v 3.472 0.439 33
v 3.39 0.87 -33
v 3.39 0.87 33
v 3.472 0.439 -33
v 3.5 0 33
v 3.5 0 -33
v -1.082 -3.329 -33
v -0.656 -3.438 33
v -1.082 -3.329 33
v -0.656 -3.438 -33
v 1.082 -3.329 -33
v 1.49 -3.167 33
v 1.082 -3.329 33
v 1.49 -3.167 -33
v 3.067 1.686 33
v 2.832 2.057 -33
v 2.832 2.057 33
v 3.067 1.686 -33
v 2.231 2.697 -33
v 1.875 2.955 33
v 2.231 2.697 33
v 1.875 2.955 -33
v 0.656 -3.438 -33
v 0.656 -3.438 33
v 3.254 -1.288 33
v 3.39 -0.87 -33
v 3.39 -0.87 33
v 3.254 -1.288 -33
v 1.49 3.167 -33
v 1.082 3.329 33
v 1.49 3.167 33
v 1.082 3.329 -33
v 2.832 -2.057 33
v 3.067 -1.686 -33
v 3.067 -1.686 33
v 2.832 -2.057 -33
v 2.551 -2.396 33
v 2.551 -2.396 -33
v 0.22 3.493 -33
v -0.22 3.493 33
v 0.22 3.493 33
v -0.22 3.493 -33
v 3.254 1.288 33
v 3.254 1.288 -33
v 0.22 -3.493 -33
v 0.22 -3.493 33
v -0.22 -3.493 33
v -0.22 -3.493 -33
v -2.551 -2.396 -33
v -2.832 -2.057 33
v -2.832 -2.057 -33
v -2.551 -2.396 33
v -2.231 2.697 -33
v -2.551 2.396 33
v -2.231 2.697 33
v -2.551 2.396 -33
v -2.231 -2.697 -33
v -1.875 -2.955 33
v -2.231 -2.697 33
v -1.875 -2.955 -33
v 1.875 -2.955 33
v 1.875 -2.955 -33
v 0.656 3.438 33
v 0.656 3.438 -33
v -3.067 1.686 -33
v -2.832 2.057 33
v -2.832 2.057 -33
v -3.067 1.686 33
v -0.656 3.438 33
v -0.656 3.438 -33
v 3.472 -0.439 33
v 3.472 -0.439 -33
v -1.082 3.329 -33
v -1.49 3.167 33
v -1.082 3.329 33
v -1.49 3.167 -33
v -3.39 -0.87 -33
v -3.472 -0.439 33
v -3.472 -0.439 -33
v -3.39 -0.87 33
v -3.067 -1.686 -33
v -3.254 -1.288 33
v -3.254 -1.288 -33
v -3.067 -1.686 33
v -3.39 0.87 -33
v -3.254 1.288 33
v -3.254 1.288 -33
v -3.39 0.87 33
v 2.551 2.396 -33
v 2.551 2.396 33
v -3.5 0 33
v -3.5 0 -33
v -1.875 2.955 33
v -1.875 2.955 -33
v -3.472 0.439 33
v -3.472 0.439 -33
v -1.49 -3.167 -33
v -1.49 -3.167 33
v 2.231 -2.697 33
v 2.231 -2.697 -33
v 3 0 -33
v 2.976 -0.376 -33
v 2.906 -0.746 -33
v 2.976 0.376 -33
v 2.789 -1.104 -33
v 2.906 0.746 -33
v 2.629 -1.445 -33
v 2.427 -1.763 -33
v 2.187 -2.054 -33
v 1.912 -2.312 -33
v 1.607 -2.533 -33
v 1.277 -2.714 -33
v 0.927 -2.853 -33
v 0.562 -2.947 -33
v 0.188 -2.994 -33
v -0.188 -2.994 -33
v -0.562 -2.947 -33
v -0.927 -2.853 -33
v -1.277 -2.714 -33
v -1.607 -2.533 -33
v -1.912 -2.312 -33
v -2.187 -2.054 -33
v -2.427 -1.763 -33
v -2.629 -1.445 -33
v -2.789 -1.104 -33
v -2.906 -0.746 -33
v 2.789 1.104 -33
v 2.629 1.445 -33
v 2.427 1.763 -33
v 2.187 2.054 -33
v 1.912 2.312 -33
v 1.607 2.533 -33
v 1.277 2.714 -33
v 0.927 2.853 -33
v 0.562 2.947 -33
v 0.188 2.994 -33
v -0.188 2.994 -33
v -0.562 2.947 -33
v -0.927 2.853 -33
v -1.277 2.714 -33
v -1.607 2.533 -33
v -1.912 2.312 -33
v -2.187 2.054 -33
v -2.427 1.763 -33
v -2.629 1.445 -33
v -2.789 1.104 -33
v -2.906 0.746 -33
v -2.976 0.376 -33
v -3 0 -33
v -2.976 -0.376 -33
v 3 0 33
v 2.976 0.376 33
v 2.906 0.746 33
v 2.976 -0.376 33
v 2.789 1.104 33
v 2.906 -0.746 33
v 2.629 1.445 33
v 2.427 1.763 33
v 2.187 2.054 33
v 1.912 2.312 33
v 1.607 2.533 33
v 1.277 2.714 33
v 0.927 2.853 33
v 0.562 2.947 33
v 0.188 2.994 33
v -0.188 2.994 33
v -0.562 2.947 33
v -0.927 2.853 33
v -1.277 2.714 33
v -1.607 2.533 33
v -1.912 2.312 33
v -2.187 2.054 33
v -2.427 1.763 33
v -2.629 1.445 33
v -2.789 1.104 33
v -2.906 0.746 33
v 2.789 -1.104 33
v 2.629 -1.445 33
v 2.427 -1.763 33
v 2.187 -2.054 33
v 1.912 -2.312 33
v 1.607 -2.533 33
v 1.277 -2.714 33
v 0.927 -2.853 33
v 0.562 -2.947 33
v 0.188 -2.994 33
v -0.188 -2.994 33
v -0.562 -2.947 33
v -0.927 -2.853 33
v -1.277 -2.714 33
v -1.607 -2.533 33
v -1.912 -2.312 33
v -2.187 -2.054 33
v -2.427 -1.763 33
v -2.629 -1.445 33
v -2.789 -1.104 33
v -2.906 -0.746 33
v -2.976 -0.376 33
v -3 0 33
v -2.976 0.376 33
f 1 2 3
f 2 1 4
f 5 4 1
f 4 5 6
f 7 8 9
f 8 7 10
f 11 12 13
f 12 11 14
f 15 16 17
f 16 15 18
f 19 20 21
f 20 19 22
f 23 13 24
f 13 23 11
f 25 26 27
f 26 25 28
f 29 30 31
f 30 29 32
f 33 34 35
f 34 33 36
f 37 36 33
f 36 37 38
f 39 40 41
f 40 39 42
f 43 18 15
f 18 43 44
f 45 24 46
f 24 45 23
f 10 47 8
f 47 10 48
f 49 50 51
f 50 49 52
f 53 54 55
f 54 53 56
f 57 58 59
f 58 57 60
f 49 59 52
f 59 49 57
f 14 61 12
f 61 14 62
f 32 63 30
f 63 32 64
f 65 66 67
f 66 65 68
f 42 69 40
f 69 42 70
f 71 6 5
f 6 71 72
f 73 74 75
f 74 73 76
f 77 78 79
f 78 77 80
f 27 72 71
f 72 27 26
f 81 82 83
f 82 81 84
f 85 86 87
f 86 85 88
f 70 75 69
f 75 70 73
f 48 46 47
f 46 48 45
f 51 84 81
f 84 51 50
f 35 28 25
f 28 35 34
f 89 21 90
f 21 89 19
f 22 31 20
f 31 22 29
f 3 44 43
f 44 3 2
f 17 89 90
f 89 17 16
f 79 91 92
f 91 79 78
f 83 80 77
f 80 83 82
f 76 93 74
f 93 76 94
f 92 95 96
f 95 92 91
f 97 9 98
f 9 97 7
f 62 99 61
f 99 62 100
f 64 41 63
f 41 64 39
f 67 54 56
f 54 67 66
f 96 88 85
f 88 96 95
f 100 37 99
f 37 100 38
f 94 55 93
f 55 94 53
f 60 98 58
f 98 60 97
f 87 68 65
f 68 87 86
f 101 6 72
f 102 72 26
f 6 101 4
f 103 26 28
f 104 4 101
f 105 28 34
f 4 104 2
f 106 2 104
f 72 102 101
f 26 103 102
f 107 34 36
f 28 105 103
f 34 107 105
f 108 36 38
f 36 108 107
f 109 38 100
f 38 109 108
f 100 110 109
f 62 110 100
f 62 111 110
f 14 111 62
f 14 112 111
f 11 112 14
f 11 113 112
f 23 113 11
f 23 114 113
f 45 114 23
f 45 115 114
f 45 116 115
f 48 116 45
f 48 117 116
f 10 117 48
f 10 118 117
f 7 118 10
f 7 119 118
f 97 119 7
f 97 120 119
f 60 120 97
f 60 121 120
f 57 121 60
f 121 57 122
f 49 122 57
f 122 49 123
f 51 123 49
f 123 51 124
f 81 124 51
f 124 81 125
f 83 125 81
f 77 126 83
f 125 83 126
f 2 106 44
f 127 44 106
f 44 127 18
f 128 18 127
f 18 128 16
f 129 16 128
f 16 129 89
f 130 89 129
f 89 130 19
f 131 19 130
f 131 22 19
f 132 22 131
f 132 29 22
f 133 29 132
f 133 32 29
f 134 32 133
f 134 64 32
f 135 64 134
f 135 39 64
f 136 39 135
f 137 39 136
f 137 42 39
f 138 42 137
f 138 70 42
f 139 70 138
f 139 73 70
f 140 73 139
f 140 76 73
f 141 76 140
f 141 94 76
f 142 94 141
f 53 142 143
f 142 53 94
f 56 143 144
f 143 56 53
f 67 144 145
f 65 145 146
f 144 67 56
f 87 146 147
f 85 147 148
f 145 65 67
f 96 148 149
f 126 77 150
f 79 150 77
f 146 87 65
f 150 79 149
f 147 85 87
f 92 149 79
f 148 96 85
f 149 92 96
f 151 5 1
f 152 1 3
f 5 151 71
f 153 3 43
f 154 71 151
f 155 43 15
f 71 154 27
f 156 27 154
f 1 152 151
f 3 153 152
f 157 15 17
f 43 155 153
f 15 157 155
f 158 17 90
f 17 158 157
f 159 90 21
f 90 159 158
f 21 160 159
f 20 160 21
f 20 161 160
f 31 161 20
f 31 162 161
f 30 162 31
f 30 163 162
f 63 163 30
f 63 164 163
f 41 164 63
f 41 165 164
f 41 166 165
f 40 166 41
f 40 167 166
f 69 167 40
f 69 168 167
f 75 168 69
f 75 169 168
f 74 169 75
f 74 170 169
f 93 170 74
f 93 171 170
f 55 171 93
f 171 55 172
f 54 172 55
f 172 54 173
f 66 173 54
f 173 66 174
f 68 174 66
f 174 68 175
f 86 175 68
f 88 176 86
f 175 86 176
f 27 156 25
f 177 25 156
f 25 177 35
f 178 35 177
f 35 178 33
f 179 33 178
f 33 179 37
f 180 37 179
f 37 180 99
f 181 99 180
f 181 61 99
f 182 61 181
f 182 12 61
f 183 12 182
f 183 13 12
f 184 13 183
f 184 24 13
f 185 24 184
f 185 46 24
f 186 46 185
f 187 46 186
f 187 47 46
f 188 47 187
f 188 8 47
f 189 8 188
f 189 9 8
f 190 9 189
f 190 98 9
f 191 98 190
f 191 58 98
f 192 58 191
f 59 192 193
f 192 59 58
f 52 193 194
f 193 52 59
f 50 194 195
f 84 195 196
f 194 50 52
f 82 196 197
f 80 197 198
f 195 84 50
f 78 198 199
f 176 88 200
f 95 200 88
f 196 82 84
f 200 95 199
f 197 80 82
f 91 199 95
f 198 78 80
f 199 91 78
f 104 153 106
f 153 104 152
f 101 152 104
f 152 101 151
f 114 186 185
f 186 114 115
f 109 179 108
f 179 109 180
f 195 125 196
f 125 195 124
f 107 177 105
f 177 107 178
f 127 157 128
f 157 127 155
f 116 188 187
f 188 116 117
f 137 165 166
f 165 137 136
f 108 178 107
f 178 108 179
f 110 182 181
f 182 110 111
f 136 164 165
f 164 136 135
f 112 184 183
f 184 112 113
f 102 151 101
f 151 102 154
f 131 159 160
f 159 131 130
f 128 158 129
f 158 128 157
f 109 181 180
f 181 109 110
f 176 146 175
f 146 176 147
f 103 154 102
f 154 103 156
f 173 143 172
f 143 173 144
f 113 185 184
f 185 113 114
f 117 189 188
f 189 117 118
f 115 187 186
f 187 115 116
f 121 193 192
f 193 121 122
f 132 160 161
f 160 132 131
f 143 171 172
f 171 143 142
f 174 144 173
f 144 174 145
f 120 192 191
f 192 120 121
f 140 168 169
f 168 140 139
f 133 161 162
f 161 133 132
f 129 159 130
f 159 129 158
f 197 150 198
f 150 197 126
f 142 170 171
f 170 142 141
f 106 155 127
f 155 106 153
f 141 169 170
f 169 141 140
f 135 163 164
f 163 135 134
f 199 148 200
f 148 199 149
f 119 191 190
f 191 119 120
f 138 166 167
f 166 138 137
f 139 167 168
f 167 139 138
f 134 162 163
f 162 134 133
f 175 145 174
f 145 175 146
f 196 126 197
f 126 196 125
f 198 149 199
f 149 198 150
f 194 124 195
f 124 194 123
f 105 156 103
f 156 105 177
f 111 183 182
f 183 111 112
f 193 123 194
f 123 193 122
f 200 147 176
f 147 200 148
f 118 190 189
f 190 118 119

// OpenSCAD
$fn = 50;


difference() {
	union() {
		translate(v = [0, 0, -33.0000000000]) {
			cylinder(h = 66, r = 3.5000000000);
		}
	}
	union() {
		translate(v = [0, 0, -100.0000000000]) {
			cylinder(h = 200, r = 3.0000000000);
		}
	}
}
